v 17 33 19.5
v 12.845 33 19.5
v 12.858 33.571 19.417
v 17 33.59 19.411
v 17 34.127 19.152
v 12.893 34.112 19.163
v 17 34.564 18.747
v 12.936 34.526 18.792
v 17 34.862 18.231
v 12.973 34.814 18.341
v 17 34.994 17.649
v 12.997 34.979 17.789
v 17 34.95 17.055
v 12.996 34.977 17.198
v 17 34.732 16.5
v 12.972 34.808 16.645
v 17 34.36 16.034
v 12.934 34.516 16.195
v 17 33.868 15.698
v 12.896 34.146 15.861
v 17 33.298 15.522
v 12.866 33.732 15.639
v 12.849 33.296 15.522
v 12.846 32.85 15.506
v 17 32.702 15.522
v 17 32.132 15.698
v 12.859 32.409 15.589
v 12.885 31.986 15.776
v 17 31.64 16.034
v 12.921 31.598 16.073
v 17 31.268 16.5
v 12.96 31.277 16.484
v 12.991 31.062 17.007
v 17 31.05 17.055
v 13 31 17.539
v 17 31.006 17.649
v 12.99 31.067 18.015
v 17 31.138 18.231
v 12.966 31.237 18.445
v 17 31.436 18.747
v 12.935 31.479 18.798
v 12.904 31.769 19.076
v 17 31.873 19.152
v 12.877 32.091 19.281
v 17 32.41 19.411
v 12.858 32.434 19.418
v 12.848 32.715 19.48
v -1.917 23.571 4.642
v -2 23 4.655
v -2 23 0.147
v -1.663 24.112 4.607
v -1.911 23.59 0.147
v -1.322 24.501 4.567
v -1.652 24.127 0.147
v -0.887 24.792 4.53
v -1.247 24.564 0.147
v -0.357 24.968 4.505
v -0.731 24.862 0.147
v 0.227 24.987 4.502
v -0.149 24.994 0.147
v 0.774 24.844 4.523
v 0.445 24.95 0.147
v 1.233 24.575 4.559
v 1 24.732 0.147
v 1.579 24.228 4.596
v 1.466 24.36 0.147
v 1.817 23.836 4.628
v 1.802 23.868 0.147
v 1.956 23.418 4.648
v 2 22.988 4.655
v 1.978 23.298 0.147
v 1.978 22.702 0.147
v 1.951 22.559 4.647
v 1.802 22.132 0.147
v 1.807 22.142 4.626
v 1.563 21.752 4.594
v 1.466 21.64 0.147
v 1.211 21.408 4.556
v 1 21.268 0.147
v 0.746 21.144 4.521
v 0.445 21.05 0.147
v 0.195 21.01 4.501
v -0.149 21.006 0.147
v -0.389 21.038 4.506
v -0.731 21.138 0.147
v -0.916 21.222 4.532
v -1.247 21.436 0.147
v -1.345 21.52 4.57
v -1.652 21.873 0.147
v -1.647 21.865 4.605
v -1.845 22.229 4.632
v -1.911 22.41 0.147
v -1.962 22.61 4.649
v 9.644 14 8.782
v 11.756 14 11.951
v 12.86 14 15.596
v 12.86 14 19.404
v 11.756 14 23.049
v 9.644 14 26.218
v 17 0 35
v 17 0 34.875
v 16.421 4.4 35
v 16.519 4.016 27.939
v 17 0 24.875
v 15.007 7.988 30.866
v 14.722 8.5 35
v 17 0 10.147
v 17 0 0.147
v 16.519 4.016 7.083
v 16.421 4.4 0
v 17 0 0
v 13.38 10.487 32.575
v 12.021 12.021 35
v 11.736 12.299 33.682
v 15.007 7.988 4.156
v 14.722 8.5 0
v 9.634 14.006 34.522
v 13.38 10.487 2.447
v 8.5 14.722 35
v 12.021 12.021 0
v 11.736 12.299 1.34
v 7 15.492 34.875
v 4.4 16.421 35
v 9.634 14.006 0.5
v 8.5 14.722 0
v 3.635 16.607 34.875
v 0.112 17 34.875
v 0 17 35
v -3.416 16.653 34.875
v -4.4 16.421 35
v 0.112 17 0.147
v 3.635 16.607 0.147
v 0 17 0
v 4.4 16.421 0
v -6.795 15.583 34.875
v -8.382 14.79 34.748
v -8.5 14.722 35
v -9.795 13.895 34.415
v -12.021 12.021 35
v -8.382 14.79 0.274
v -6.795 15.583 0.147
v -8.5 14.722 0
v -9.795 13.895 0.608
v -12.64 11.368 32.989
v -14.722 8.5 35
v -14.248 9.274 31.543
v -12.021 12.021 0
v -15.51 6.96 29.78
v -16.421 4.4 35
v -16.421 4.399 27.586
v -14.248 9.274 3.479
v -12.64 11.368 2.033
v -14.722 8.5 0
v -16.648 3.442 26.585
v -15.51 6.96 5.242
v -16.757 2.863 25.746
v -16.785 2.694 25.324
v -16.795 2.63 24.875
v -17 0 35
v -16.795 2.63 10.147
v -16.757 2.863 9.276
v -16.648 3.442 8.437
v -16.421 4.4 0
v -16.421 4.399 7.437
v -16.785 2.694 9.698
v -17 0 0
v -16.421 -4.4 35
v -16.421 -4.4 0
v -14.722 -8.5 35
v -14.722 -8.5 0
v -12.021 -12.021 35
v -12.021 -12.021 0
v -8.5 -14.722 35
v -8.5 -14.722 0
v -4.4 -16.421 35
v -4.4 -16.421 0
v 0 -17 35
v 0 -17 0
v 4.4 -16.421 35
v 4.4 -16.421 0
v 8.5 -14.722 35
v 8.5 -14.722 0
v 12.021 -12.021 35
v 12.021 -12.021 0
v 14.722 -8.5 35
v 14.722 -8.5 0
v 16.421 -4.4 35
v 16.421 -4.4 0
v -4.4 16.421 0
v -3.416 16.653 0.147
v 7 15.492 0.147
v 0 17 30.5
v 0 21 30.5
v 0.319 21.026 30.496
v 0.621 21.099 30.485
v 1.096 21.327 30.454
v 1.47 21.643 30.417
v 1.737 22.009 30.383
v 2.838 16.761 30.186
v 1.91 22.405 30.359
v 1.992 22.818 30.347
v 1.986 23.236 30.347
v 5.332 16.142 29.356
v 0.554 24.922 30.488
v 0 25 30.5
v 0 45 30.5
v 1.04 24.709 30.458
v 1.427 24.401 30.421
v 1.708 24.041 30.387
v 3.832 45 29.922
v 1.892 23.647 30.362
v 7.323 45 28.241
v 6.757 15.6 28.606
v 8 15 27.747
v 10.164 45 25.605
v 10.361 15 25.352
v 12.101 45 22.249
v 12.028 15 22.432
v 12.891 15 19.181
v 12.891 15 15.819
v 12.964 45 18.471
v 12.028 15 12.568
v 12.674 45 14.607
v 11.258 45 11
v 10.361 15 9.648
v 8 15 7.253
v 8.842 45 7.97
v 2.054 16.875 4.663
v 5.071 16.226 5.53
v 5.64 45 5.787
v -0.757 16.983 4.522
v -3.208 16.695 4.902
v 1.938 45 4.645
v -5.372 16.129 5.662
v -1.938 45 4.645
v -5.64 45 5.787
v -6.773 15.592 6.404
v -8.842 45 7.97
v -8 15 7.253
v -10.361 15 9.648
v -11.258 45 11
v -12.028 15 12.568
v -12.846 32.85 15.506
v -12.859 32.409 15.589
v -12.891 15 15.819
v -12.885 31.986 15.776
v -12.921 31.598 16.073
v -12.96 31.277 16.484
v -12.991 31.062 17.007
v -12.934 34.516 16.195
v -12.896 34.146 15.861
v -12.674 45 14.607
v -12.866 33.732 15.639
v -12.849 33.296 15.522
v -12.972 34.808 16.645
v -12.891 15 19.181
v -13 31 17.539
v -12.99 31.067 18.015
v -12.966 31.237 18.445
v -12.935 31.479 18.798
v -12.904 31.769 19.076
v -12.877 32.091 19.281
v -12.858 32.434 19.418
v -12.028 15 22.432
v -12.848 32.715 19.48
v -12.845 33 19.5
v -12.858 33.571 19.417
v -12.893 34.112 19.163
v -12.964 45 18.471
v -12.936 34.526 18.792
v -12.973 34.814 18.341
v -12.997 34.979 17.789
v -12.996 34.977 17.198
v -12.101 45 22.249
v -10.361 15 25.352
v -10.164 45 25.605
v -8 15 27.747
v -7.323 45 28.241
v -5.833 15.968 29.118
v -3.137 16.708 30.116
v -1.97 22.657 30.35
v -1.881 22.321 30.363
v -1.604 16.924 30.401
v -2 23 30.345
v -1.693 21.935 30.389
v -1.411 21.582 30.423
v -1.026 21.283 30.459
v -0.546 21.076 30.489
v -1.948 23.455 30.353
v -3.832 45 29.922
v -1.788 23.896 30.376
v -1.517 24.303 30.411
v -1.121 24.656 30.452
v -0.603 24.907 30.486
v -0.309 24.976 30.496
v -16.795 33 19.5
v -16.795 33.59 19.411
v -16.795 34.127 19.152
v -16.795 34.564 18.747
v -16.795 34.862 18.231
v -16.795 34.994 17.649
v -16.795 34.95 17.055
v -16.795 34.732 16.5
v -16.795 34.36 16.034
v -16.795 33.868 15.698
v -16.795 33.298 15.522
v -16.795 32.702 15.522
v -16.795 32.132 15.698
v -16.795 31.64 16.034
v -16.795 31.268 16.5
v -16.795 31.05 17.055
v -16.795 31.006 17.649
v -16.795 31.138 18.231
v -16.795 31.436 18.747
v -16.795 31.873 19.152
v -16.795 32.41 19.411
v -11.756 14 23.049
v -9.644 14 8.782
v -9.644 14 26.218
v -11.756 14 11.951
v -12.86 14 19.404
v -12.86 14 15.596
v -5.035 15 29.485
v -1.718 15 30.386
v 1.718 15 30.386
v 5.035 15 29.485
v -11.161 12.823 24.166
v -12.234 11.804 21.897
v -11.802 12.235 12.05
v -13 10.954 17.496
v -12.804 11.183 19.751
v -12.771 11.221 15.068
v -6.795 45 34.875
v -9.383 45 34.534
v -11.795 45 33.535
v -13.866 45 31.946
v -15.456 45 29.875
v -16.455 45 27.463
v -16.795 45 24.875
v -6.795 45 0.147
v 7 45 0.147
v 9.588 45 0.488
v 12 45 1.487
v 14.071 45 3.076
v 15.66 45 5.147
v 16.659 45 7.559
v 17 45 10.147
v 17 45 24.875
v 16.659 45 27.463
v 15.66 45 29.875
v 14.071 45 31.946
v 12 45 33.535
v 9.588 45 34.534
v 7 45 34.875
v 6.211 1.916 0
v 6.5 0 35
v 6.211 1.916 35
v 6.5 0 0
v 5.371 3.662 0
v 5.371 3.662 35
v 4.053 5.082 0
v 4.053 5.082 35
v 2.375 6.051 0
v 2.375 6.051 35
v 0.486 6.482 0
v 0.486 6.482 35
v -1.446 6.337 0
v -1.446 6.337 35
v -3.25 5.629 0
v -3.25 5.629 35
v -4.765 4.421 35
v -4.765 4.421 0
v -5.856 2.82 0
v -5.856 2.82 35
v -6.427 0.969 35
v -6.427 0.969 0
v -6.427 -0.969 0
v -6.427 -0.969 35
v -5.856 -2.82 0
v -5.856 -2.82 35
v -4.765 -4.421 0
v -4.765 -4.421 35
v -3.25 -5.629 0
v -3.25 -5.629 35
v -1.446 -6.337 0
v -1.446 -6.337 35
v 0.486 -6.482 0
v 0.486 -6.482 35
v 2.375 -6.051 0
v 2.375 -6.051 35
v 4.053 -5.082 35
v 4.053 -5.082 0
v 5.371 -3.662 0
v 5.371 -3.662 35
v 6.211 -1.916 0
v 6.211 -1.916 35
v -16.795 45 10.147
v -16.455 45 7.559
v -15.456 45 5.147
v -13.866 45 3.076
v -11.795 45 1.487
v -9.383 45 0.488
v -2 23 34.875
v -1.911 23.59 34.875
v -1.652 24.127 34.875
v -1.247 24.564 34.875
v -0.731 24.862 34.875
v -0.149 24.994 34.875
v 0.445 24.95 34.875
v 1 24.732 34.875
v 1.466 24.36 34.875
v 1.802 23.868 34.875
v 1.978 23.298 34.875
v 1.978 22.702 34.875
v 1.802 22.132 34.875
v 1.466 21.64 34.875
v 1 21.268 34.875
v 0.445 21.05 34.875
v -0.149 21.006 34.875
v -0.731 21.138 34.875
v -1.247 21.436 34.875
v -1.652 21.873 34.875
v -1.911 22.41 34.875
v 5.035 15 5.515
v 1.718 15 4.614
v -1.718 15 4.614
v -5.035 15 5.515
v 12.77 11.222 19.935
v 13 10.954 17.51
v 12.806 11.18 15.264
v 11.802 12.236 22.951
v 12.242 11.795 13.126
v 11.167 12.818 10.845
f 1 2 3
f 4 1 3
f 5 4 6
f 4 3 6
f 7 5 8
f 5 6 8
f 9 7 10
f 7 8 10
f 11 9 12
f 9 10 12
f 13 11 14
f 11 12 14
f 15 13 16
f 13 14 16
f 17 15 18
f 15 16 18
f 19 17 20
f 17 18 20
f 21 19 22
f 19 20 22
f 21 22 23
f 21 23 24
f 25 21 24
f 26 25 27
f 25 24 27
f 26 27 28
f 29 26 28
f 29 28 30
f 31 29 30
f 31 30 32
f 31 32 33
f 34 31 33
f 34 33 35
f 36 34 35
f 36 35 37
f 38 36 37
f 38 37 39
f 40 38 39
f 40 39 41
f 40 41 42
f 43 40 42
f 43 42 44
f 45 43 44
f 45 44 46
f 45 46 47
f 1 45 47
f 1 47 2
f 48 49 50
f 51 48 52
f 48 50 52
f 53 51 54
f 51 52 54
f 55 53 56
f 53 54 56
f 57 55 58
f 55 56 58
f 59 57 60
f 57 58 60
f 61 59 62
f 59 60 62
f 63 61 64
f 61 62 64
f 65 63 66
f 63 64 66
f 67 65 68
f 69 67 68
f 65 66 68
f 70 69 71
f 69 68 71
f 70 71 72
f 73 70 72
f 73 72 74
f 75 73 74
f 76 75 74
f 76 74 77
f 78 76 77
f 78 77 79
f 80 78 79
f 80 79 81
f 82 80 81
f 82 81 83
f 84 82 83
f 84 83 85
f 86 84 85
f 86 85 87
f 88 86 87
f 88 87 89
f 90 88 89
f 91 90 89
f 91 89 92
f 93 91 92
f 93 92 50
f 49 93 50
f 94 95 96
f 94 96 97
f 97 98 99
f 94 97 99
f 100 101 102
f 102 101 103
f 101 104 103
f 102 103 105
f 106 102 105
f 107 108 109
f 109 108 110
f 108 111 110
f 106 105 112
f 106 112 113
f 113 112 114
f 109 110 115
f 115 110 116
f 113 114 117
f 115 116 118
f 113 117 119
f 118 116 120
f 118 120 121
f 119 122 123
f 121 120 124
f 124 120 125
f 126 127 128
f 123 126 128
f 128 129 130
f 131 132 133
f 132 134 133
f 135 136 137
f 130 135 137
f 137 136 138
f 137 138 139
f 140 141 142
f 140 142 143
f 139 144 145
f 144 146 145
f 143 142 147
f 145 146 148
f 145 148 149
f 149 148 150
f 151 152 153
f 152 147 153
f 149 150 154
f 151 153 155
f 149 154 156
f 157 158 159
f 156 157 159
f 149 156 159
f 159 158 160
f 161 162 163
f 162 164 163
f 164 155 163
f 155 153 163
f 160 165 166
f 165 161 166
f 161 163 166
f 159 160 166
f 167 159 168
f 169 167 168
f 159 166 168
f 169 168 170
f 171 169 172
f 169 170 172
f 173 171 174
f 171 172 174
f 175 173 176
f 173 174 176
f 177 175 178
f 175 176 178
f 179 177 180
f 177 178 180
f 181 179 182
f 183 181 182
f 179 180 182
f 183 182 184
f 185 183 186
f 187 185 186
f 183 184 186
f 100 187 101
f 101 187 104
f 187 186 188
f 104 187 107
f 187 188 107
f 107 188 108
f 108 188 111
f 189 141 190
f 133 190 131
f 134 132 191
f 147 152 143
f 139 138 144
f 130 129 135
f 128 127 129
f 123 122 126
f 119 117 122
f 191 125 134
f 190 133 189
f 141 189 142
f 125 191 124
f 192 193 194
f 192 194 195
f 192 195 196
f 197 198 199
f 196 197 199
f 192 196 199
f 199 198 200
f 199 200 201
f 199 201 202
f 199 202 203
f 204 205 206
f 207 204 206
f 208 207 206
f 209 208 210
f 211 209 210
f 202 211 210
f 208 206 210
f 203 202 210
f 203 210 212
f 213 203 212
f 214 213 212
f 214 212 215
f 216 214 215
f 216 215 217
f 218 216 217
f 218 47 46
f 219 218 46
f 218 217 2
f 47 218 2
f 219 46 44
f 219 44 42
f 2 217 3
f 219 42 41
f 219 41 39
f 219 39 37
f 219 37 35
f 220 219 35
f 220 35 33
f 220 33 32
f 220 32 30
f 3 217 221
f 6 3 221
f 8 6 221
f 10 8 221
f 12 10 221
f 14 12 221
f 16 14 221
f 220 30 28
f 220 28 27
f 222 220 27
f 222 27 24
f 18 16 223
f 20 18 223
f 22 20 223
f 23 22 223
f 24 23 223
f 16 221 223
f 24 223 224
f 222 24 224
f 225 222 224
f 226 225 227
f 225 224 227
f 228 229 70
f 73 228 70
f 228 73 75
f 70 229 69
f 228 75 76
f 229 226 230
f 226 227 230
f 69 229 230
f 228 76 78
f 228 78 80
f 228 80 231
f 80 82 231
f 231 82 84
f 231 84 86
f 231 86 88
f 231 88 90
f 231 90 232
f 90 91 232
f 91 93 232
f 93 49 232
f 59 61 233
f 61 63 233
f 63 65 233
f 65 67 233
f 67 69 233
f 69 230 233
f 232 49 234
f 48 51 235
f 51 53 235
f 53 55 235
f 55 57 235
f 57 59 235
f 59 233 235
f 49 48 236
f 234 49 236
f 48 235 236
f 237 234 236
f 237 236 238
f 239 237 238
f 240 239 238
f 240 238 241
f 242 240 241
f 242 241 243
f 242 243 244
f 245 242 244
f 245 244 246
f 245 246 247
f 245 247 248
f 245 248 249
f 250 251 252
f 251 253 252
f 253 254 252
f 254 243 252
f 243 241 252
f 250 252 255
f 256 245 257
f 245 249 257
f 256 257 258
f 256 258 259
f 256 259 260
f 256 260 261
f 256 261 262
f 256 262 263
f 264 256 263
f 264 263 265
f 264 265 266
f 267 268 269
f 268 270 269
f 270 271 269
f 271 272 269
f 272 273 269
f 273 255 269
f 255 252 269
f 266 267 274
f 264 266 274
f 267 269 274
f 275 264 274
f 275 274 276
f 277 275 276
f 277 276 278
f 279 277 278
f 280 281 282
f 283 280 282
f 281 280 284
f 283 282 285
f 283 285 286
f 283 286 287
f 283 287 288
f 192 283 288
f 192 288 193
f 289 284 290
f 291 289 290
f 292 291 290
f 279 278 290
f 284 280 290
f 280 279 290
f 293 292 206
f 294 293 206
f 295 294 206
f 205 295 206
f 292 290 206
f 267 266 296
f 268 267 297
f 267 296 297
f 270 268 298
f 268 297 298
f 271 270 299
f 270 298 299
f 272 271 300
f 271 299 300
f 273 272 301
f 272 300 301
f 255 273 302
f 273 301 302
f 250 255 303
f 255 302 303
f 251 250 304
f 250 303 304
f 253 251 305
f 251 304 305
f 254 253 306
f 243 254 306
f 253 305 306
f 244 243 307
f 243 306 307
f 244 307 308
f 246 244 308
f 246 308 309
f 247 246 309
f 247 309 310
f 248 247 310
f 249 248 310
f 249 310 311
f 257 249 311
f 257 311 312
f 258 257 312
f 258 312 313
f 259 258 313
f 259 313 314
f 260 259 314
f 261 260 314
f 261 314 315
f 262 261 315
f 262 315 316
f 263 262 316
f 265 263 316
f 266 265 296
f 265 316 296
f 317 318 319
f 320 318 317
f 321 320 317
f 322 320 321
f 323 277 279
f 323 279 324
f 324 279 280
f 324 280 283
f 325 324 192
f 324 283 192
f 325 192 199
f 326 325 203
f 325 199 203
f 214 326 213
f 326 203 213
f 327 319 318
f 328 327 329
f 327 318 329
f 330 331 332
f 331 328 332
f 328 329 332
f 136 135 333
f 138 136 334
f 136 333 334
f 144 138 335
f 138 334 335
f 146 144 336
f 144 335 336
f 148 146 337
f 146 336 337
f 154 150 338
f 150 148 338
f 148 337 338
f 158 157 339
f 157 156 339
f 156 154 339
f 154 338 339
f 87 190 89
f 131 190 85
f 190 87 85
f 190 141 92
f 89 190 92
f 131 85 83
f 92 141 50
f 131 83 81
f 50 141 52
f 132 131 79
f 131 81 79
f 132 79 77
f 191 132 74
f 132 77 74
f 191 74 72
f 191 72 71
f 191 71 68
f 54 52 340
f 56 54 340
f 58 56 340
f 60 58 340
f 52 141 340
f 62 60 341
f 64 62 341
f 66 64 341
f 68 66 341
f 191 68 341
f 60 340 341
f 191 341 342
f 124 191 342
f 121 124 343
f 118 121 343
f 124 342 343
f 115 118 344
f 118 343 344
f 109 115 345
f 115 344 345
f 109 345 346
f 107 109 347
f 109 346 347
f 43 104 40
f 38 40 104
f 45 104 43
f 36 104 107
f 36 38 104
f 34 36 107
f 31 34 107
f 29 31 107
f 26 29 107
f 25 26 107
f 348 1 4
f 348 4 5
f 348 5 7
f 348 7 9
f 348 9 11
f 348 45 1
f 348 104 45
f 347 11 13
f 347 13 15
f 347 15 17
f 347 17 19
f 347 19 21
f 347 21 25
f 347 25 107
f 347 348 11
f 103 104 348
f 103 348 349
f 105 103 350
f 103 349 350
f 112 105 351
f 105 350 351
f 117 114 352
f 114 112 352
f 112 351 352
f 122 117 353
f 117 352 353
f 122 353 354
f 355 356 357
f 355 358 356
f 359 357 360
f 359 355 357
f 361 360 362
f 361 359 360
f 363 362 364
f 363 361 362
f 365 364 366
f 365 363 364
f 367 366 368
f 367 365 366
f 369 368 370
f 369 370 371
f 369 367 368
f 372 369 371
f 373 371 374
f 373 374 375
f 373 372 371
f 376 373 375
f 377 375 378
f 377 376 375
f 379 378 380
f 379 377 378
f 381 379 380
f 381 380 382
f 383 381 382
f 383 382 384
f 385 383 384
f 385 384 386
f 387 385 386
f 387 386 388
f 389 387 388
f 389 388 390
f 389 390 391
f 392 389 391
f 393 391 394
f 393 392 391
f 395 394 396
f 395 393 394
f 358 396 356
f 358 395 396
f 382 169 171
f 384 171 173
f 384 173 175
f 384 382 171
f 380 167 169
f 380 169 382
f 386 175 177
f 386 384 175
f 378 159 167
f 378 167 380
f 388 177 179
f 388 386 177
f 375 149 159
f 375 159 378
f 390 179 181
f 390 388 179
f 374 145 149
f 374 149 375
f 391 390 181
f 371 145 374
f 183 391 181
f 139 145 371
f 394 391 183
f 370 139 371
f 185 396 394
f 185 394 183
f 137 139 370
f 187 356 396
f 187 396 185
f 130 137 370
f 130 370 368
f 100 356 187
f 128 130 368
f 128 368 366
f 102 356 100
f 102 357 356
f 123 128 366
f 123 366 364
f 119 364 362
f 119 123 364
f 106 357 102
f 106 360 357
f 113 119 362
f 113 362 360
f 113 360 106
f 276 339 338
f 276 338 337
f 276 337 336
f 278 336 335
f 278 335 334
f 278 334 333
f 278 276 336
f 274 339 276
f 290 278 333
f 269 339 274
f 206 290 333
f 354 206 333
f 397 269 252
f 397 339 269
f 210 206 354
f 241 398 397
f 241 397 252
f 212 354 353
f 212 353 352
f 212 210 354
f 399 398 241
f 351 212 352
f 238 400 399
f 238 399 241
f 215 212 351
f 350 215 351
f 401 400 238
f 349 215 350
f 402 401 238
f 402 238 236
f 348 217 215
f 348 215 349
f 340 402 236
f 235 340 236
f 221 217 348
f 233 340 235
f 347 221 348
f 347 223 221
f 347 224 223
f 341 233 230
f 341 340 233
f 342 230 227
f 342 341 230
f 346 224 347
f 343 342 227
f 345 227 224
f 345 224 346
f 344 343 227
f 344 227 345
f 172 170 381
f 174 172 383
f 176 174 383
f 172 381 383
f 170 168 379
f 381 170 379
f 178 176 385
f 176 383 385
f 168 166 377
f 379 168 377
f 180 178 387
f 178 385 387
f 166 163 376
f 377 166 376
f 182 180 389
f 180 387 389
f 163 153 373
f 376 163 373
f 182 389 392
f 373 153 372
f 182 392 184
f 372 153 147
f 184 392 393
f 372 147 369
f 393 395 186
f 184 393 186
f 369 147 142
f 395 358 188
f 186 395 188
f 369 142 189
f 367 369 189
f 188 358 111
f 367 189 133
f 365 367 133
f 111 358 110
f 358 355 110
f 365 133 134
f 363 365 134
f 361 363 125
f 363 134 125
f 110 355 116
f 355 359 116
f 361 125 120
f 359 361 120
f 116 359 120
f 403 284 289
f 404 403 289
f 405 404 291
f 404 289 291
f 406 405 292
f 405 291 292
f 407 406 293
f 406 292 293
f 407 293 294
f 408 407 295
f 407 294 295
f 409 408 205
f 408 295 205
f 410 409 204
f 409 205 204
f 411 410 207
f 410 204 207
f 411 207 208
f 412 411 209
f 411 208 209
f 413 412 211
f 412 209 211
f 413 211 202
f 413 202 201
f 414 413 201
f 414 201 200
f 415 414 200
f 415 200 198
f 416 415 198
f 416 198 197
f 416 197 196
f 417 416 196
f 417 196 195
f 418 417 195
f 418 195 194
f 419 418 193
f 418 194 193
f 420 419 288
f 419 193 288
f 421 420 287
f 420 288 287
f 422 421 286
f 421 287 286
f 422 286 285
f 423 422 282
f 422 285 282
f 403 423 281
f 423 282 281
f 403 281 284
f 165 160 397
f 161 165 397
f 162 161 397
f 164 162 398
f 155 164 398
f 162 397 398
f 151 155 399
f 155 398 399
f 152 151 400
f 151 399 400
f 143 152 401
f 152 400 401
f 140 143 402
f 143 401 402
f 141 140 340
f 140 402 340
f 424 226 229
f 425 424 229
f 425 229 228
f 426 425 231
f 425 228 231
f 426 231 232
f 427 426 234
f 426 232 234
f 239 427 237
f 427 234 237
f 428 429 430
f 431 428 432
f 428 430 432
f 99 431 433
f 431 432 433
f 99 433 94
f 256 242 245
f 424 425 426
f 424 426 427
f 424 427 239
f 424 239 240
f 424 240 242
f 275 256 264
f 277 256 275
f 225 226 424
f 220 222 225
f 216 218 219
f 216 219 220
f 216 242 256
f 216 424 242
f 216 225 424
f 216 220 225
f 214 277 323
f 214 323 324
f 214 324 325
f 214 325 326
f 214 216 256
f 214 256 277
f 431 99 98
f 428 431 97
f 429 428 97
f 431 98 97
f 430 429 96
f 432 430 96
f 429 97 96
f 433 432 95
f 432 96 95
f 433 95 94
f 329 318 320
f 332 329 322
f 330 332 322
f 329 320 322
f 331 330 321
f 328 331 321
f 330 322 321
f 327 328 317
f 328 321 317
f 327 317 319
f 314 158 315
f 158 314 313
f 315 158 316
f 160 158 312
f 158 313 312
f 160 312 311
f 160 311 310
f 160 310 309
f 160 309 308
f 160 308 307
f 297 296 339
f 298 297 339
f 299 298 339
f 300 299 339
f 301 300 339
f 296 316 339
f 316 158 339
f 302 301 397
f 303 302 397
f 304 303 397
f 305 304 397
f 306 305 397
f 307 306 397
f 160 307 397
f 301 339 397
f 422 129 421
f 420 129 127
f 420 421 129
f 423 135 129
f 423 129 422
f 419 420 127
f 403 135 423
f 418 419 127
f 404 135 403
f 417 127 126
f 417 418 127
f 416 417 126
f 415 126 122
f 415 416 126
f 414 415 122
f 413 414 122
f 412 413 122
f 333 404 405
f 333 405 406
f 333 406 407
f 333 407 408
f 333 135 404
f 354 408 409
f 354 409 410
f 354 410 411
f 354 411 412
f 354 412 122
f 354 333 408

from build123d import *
from build123d.topology import SkipClean

# Parameters (mm, degrees)
SKETCH_1_R           = 17
SKETCH_1_R_2         = 6.5
EXTRUDE_2_DEPTH      = 35
SKETCH_3_W           = 33.795275063
SKETCH_3_H           = 34.72803434
SKETCH_3_R           = 13
EXTRUDE_7_DEPTH      = 45
SKETCH_4_R           = 6.5
CUT_EXTRUDE_1_DEPTH  = 60.489495005
SKETCH_12_R          = 2
CUT_EXTRUDE_11_DEPTH = 45
SKETCH_15_R          = 2
CUT_EXTRUDE_12_DEPTH = 45
FILLET_4_R           = 10
SKETCH_20_R          = 13
CUT_EXTRUDE_18_DEPTH = 31
EXTRUDE_START        = 1
SKETCH_25_R          = 13
EXTRUDE_10_DEPTH     = 1


with BuildPart() as part:
    # Эскиз1 → Бобышка-Вытянуть2 (new body)
    with BuildSketch(Plane.XY):
        Circle(SKETCH_1_R)
        Circle(SKETCH_1_R_2, mode=Mode.SUBTRACT)
    extrude(amount=EXTRUDE_2_DEPTH)

    # Эскиз3 → Бобышка-Вытянуть7 (add)
    with BuildSketch(Plane(origin=(0, 45, 0), x_dir=(1, 0, 0), z_dir=(0, 1, 0))):
        with Locations((0.102362468, -17.511098906)):
            Rectangle(SKETCH_3_W, SKETCH_3_H)
        with Locations(Location((0, -17.5, 0), (0, 0, 270))):
            Circle(SKETCH_3_R, mode=Mode.SUBTRACT)
    extrude(amount=-EXTRUDE_7_DEPTH)

    # Эскиз4 → Вырез-Вытянуть1 (cut, through all)
    with BuildSketch(Plane(origin=(0, 0, 0), x_dir=(-1, 0, 0), z_dir=(0, 0, -1))):
        with Locations(Location((0, 0, 0), (0, 0, 180))):
            Circle(SKETCH_4_R)
    extrude(amount=-CUT_EXTRUDE_1_DEPTH, mode=Mode.SUBTRACT)

    # Эскиз12 → Вырез-Вытянуть11 (cut)
    with BuildSketch(Plane(origin=(0, 0, 0), x_dir=(-1, 0, 0), z_dir=(0, 0, -1))):
        with Locations((0, 23)):
            Circle(SKETCH_12_R)
    extrude(amount=-CUT_EXTRUDE_11_DEPTH, mode=Mode.SUBTRACT)

    # Эскиз15 → Вырез-Вытянуть12 (cut)
    with BuildSketch(Plane.ZY.offset(16.795275063)):
        with Locations((17.5, 33)):
            Circle(SKETCH_15_R)
    extrude(amount=-CUT_EXTRUDE_12_DEPTH, mode=Mode.SUBTRACT)

    # Скругление4
    # the kernel refuses this fillet: 10 mm, written as the material it takes off along each edge
    with BuildSketch(Plane(origin=(-16.795275063, 70, 34.875116076), x_dir=(1, 0, 0), z_dir=(0, -1, 0))) as fillet_4_piece_1_section:
        with BuildLine():
            CenterArc((FILLET_4_R, -FILLET_4_R), FILLET_4_R, 90, 90)
            Line((0, -FILLET_4_R), (0, 0))
            Line((0, 0), (FILLET_4_R, 0))
        make_face()
    fillet_4_piece_1 = extrude(amount=92.369651061, mode=Mode.PRIVATE)
    fillet_4_piece_1 = fillet_4_piece_1 - Plane(origin=(0, 0, 32.54483178), x_dir=(1, 0, 0), z_dir=(0, 0, -1)) * Cylinder(17, 225, mode=Mode.PRIVATE)
    add(fillet_4_piece_1, mode=Mode.SUBTRACT)
    with BuildSketch(Plane(origin=(17, 70, 0.147081736), x_dir=(0, 0, 1), z_dir=(0, -1, 0))) as fillet_4_piece_2_section:
        with BuildLine():
            CenterArc((FILLET_4_R, FILLET_4_R), FILLET_4_R, 180, 90)
            Line((0, FILLET_4_R), (0, 0))
            Line((0, 0), (FILLET_4_R, 0))
        make_face()
    fillet_4_piece_2 = extrude(amount=95, mode=Mode.PRIVATE)
    fillet_4_piece_2 = fillet_4_piece_2 - Plane(origin=(0, 0, 2.486350956), x_dir=(1, 0, 0), z_dir=(0, 0, -1)) * Cylinder(17, 230, mode=Mode.PRIVATE)
    add(fillet_4_piece_2, mode=Mode.SUBTRACT)
    with BuildSketch(Plane(origin=(17, 70, 34.875116076), x_dir=(0, 0, -1), z_dir=(0, -1, 0))) as fillet_4_piece_3_section:
        with BuildLine():
            CenterArc((FILLET_4_R, -FILLET_4_R), FILLET_4_R, 90, 90)
            Line((0, -FILLET_4_R), (0, 0))
            Line((0, 0), (FILLET_4_R, 0))
        make_face()
    fillet_4_piece_3 = extrude(amount=95, mode=Mode.PRIVATE)
    fillet_4_piece_3 = fillet_4_piece_3 - Plane(origin=(0, 0, 32.535846855), x_dir=(1, 0, 0), z_dir=(0, 0, -1)) * Cylinder(17, 230, mode=Mode.PRIVATE)
    add(fillet_4_piece_3, mode=Mode.SUBTRACT)
    with BuildSketch(Plane(origin=(-16.795275063, 70, 0.147081736), x_dir=(0, 0, 1), z_dir=(0, -1, 0))) as fillet_4_piece_4_section:
        with BuildLine():
            CenterArc((FILLET_4_R, -FILLET_4_R), FILLET_4_R, 90, 90)
            Line((0, -FILLET_4_R), (0, 0))
            Line((0, 0), (FILLET_4_R, 0))
        make_face()
    fillet_4_piece_4 = extrude(amount=92.369651061, mode=Mode.PRIVATE)
    fillet_4_piece_4 = fillet_4_piece_4 - Plane(origin=(0, 0, 2.477367304), x_dir=(1, 0, 0), z_dir=(0, 0, -1)) * Cylinder(17, 225, mode=Mode.PRIVATE)
    add(fillet_4_piece_4, mode=Mode.SUBTRACT)

    # Эскиз20 → Вырез-Вытянуть18 (cut)
    with SkipClean():  # the faces are left unmerged after this step: merging them gives an invalid solid
        with BuildSketch(Plane(origin=(0, 45, 0), x_dir=(1, 0, 0), z_dir=(0, 1, 0))):
            with Locations(Location((0, -17.5, 0), (0, 0, 270))):
                Circle(SKETCH_20_R)
        extrude(amount=-CUT_EXTRUDE_18_DEPTH, mode=Mode.SUBTRACT)

    # Эскиз25 → Бобышка-Вытянуть10 (add)
    with BuildSketch(Plane(origin=(0, 14, 0), x_dir=(1, 0, 0), z_dir=(0, 1, 0)).offset(EXTRUDE_START)):
        with Locations(Location((0, -17.5, 0), (0, 0, 270))):
            Circle(SKETCH_25_R)
    extrude(amount=-EXTRUDE_10_DEPTH)


solid = part.part
